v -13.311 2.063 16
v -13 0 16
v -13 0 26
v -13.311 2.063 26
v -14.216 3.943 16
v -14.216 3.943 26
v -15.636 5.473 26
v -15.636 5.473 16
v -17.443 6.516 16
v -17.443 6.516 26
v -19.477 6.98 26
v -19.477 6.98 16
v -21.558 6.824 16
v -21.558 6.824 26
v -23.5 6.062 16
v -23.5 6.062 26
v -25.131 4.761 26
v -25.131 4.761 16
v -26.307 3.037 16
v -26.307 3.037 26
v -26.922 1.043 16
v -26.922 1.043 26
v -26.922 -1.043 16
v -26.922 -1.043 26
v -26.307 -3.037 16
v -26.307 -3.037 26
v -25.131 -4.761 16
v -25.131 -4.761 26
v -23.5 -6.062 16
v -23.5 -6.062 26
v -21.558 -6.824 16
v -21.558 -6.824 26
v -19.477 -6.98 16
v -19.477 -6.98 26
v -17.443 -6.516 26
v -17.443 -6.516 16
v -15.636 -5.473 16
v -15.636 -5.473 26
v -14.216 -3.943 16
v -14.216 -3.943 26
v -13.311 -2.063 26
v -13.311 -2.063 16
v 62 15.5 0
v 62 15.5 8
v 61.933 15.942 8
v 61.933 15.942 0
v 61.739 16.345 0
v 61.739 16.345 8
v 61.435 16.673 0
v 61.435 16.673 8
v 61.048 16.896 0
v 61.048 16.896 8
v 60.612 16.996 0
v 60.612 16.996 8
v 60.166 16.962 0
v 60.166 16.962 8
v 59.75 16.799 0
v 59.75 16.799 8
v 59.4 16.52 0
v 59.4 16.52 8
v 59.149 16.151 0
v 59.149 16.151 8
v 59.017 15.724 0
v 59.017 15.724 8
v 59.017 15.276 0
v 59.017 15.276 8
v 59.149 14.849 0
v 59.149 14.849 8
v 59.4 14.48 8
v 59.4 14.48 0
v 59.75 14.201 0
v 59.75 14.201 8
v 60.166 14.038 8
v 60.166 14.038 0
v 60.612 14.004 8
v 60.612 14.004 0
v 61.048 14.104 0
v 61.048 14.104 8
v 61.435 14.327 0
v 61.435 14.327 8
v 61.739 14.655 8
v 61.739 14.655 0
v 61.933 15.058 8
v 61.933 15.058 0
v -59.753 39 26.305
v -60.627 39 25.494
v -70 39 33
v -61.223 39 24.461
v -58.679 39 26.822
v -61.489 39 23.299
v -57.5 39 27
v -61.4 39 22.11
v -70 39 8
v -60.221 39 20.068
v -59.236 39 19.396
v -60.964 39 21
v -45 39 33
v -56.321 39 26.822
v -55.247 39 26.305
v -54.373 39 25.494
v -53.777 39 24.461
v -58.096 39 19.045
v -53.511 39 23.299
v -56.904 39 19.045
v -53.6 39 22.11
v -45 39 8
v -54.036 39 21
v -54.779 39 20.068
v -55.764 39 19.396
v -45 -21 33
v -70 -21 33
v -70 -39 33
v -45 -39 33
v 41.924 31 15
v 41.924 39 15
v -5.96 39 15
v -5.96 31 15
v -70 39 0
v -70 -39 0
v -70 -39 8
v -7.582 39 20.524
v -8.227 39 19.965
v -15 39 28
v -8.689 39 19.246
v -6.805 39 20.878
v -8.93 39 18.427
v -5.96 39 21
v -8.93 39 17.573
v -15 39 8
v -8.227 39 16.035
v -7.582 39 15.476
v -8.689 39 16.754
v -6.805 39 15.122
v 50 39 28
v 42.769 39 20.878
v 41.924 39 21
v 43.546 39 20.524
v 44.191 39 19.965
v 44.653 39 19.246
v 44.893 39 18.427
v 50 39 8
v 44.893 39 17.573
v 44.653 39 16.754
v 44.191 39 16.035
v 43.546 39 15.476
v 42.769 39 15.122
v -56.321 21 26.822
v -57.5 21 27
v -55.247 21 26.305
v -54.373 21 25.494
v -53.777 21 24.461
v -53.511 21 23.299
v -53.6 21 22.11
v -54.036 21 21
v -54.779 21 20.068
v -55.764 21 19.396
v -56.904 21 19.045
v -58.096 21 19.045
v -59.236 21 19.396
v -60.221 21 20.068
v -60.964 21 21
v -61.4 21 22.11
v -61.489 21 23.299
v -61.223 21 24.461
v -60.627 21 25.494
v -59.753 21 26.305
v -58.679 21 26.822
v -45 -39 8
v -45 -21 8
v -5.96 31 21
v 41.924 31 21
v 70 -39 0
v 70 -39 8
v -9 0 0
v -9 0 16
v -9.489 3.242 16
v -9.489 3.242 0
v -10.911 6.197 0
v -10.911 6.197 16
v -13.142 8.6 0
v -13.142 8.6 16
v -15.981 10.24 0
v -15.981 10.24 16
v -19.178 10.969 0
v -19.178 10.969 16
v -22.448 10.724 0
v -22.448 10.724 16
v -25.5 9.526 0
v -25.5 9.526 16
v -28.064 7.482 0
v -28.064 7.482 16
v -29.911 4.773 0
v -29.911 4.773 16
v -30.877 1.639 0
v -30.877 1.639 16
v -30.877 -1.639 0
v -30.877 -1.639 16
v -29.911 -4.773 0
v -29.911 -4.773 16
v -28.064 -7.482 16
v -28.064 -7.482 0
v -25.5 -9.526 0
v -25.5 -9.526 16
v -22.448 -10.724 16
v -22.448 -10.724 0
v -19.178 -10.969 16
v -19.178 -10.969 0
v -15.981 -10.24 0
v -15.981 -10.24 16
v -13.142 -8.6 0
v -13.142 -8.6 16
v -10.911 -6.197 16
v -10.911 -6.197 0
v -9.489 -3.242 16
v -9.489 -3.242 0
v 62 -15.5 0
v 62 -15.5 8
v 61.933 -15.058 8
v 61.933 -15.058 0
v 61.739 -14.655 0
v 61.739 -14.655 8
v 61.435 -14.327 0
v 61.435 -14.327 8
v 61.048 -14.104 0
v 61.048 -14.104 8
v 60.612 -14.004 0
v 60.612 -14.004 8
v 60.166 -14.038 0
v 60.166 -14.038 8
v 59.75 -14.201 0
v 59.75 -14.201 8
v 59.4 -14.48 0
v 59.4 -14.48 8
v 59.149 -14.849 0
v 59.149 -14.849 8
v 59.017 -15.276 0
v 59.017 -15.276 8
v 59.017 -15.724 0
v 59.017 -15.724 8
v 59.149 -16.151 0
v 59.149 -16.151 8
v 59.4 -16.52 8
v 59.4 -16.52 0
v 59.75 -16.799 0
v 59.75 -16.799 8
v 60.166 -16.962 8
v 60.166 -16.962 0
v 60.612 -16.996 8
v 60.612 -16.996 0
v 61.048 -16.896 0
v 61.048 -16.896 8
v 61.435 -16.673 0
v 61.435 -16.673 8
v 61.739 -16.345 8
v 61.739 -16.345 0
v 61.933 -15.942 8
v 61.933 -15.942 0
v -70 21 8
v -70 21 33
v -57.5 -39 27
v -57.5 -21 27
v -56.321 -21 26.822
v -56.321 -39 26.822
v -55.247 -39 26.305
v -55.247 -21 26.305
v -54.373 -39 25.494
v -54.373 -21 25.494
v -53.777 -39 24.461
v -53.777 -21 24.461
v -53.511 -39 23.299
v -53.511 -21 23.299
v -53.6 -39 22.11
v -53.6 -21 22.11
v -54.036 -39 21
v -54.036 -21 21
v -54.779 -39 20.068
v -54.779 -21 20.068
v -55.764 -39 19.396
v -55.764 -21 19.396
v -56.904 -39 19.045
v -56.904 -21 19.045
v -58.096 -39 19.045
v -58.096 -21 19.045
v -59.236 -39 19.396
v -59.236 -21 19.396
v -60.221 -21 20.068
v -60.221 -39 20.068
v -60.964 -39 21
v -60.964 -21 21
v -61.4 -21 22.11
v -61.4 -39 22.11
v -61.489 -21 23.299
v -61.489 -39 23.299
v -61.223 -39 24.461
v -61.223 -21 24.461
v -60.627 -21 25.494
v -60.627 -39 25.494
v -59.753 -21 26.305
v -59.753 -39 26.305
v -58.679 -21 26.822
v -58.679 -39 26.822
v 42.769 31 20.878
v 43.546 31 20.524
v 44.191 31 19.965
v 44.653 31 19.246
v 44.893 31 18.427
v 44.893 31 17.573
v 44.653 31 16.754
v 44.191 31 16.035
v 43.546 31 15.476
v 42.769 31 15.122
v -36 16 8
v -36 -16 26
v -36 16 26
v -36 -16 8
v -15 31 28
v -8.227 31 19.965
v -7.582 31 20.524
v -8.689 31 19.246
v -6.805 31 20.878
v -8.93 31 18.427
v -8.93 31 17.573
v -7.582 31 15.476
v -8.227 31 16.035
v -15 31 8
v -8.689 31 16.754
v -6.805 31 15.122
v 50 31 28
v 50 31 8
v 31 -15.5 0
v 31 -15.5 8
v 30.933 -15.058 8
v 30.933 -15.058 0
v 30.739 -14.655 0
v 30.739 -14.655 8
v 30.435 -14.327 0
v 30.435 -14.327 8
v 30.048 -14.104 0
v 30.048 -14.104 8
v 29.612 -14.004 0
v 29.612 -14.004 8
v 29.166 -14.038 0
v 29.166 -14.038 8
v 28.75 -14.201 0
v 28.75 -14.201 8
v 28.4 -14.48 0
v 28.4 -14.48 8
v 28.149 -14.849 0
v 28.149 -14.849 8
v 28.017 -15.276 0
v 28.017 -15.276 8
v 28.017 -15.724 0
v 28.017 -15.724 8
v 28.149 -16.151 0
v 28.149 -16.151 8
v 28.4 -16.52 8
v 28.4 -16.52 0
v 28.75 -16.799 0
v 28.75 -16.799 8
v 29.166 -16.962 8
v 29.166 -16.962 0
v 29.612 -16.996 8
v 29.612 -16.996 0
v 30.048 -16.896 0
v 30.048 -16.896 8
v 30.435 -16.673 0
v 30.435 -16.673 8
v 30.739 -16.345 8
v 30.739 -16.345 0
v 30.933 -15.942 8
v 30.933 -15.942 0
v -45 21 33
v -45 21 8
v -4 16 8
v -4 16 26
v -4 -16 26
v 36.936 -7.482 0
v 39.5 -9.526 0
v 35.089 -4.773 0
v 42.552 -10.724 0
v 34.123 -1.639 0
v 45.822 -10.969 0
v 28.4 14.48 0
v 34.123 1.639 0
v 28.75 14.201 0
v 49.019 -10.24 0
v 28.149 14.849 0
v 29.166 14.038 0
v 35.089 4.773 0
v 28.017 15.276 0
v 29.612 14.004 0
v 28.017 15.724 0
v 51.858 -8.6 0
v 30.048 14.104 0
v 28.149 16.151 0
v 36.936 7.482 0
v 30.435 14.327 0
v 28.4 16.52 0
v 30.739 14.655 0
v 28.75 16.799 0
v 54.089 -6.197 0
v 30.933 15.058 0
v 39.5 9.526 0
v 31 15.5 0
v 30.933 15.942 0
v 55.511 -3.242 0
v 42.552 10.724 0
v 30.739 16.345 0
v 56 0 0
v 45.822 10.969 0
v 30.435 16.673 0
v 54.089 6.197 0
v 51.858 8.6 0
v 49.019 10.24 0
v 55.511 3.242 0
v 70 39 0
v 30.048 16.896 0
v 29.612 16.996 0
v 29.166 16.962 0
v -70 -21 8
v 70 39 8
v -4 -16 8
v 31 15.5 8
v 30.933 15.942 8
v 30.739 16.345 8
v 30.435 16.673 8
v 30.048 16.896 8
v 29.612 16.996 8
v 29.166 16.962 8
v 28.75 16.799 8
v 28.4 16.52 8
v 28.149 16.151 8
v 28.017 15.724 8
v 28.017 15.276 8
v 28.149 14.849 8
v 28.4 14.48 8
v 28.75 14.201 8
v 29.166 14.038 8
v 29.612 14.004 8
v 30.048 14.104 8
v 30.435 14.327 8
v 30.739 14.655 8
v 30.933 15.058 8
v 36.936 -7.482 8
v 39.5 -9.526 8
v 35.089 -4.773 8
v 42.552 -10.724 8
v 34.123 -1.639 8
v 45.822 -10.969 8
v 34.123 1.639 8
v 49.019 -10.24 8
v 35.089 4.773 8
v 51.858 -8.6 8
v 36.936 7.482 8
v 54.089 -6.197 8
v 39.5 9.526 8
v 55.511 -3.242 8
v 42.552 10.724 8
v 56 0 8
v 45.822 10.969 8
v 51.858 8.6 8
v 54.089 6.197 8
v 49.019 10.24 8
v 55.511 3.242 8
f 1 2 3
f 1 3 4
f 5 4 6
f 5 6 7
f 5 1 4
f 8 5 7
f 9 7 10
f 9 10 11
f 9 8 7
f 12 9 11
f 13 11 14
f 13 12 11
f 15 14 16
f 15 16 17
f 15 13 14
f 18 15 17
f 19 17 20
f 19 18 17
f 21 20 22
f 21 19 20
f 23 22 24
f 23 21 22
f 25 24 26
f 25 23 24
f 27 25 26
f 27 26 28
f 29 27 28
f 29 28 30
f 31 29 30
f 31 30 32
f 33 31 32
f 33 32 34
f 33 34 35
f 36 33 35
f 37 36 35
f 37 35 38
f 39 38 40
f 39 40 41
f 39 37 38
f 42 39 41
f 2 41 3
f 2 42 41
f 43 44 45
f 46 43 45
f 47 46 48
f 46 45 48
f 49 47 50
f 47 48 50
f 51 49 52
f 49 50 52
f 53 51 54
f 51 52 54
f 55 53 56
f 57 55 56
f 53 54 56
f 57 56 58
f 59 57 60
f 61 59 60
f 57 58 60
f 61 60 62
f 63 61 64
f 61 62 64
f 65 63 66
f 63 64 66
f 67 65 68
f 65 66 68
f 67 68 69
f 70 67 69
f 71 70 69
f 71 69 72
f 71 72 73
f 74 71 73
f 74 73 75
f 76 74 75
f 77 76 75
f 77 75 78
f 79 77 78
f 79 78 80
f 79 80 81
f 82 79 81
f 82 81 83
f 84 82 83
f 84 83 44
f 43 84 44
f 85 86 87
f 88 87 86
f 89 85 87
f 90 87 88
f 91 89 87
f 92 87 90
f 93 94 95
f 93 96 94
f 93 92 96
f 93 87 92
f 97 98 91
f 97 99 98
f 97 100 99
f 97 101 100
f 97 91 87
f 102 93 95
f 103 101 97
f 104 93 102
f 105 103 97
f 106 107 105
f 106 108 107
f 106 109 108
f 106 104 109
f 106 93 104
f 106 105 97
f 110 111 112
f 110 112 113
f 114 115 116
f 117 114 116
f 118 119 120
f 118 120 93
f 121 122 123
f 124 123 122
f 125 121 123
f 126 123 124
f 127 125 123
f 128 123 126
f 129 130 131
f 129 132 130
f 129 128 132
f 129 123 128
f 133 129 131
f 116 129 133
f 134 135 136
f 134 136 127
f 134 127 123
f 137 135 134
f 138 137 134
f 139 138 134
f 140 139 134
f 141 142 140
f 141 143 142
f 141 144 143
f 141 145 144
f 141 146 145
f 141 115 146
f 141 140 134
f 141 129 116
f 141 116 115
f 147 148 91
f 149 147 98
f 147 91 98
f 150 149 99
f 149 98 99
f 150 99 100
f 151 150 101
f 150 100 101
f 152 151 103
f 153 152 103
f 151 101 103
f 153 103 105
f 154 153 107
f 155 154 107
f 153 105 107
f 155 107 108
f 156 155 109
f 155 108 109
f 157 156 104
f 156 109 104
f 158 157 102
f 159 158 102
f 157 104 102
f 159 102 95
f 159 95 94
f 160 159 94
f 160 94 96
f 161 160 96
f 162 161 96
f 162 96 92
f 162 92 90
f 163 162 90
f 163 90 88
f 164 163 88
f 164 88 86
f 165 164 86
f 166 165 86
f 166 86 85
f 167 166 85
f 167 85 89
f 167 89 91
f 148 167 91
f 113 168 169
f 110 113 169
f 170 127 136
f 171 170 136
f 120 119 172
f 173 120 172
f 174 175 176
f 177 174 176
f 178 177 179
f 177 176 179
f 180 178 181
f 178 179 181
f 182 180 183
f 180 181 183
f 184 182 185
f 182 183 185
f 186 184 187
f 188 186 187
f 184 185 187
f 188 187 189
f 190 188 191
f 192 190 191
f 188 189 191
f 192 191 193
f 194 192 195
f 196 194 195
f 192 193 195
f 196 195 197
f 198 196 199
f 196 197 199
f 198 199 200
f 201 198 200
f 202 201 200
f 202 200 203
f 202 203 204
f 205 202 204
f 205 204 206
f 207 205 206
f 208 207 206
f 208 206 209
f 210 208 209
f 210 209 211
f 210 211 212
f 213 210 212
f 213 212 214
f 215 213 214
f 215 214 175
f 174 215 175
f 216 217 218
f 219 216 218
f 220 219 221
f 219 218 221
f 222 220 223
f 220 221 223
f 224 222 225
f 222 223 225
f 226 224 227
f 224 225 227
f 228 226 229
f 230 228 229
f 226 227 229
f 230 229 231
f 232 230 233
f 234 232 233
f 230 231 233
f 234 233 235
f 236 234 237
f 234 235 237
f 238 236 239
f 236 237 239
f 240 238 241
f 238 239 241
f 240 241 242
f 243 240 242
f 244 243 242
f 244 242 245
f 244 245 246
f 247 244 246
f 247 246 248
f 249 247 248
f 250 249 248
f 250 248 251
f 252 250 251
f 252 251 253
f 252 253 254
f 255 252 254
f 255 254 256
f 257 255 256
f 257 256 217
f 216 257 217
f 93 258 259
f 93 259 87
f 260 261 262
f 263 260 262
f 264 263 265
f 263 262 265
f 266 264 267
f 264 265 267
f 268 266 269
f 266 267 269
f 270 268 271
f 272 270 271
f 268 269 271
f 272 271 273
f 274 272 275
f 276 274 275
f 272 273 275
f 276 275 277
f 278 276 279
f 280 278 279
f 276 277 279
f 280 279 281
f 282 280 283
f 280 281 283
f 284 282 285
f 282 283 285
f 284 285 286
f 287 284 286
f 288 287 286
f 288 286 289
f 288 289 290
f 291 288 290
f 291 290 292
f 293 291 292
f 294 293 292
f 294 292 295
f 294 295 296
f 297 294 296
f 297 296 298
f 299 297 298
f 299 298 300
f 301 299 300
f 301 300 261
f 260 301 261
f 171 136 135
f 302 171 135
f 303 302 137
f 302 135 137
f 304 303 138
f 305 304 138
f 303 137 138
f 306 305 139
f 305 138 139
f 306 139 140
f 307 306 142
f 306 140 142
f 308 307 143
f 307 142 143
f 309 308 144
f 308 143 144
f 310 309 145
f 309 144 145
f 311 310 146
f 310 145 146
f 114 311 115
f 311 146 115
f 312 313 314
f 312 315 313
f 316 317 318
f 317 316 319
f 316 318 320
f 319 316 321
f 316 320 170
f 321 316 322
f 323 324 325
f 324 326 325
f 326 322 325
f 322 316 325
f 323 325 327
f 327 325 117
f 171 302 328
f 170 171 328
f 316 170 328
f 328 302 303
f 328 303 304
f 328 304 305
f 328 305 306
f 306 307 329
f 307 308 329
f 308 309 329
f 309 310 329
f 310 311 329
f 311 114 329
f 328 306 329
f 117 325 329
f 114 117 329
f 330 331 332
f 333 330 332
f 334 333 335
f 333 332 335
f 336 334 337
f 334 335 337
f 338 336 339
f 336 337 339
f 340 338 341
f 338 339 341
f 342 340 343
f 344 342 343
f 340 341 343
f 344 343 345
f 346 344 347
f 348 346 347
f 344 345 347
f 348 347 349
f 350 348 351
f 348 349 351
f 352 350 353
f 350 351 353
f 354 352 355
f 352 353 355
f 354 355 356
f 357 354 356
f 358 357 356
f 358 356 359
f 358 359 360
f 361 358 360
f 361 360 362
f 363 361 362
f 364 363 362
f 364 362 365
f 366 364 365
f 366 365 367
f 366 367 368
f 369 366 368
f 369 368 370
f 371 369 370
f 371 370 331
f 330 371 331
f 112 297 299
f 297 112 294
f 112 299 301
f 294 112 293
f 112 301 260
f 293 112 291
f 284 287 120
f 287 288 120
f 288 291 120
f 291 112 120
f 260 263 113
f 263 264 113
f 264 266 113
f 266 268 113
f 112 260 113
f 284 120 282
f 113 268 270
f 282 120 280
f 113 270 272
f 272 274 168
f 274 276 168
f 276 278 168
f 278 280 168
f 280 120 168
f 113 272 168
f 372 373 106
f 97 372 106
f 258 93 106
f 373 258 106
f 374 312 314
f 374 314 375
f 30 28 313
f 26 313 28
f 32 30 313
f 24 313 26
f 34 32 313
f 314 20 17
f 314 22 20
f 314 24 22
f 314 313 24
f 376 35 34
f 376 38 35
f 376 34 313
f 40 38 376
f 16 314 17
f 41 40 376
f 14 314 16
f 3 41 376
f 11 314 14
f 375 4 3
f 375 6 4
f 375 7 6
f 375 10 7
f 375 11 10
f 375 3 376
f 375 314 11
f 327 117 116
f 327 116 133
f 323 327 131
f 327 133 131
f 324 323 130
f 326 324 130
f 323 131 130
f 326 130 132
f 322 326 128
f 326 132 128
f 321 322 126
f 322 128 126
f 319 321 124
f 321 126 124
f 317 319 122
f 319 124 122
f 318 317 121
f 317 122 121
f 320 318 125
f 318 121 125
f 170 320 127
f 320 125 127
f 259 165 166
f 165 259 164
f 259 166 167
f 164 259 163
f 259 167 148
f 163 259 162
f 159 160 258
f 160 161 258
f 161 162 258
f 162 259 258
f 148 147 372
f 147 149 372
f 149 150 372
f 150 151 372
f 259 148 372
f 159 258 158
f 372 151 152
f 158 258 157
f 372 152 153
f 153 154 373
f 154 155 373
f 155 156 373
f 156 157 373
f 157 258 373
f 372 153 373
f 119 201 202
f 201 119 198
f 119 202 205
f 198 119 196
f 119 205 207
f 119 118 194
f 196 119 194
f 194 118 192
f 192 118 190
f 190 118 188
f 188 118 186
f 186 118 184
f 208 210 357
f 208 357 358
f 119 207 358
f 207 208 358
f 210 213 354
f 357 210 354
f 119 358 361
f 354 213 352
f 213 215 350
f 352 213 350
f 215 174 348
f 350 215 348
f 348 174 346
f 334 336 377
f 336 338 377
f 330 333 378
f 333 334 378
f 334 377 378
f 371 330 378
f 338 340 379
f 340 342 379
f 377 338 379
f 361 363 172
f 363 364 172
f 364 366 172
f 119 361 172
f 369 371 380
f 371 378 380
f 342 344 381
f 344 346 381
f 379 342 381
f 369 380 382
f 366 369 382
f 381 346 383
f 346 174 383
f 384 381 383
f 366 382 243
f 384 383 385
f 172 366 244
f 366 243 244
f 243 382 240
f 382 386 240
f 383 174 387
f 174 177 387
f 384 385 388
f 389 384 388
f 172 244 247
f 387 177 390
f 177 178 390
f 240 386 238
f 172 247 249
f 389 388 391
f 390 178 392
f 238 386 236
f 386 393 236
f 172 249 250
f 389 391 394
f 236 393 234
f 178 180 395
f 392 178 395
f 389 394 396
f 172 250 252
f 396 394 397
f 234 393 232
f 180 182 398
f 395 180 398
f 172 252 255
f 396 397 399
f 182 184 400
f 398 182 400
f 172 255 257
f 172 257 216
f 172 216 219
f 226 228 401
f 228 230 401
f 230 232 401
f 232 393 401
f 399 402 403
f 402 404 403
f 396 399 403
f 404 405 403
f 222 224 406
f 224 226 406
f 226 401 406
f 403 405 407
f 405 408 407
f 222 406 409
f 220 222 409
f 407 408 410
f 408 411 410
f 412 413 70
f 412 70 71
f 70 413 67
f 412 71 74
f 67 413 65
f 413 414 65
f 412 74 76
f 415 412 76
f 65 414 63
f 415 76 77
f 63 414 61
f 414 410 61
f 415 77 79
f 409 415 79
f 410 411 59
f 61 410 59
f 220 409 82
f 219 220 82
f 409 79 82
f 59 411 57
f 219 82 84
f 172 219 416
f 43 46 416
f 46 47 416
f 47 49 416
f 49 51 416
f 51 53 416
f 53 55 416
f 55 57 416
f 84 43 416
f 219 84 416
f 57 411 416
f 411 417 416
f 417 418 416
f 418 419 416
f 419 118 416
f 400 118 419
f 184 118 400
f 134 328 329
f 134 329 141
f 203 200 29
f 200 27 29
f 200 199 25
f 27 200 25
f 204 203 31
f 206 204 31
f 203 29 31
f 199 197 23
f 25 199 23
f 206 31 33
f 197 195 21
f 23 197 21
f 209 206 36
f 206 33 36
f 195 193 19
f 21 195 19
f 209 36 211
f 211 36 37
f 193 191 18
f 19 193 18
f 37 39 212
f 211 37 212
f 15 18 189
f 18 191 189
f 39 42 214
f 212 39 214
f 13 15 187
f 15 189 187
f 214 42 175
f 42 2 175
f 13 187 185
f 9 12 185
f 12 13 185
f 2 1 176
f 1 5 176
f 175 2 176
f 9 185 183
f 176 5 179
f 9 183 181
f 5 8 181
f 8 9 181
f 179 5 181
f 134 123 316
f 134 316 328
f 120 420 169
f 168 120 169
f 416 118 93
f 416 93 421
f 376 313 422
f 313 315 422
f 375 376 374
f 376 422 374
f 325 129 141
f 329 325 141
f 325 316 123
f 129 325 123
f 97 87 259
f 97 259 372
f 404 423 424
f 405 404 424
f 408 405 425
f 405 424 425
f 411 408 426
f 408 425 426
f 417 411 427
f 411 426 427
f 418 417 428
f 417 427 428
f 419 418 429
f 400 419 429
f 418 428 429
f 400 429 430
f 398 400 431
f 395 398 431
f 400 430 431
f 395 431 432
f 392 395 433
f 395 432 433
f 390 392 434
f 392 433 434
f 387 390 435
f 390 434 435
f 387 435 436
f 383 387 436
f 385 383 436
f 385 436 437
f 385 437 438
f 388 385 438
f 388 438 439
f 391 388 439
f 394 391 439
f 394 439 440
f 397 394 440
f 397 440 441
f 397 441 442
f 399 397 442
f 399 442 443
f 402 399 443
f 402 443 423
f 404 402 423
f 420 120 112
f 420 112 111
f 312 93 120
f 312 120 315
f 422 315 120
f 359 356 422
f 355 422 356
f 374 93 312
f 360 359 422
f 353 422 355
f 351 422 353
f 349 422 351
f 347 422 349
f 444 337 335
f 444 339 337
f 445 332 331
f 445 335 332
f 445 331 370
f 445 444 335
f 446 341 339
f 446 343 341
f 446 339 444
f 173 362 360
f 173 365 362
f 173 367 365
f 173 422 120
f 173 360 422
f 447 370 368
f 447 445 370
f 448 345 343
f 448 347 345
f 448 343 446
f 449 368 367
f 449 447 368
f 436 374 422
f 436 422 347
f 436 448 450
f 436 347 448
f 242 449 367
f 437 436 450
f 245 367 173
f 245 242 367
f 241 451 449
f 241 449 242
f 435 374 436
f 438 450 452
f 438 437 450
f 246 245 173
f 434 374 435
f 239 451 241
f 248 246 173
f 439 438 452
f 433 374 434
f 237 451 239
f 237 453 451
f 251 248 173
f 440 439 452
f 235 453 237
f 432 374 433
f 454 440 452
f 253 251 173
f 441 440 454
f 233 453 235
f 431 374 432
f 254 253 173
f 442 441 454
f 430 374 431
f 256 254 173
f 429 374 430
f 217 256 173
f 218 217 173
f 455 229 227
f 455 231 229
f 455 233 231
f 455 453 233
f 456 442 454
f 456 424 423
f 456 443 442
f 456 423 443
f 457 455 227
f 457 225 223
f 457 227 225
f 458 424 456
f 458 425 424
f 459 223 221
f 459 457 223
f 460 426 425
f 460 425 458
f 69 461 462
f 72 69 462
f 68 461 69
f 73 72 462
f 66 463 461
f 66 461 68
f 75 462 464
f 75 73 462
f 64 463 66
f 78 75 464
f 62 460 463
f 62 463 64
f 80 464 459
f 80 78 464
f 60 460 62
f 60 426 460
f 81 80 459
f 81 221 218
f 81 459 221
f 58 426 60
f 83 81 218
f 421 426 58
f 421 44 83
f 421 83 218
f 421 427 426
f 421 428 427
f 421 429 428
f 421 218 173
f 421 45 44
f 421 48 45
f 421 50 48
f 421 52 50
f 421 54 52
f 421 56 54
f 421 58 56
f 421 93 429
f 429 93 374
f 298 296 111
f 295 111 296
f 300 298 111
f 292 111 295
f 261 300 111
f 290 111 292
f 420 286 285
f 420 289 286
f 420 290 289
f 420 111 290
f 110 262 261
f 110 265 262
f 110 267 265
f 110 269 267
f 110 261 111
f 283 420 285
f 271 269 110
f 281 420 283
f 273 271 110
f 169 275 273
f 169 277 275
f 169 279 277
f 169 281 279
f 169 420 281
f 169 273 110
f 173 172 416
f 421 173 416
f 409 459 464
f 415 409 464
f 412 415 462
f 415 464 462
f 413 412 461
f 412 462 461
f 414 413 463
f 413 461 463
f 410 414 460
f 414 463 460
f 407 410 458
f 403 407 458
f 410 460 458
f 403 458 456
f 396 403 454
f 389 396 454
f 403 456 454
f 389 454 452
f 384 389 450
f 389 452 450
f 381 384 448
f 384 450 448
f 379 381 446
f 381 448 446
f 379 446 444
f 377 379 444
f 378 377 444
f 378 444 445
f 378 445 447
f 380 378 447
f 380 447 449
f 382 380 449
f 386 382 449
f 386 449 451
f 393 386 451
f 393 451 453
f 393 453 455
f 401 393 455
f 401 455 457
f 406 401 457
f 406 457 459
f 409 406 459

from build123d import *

# Parameters (mm, degrees)
SKETCH1_W             = 140
SKETCH1_H             = 78
BOSS_EXTRUDE1_DEPTH   = 8
CUT_EXTRUDE1_REACH    = 82.529
SKETCH2_R             = 1.5
SKETCH2_R_2           = 11
SKETCH3_W             = 25
SKETCH3_H             = 18
BOSS_EXTRUDE2_DEPTH   = 25
BOSS_EXTRUDE2_2_DEPTH = 25
SKETCH4_R             = 4
CUT_EXTRUDE2_DEPTH    = 110.877204187
BOSS_EXTRUDE4_START   = 8
SKETCH7_W             = 32
SKETCH7_H             = 32
SKETCH7_R             = 11
BOSS_EXTRUDE4_DEPTH   = 8
SKETCH8_W             = 32
SKETCH8_H             = 32
SKETCH8_R             = 7
BOSS_EXTRUDE5_DEPTH   = 10
SKETCH9_W             = 65
SKETCH9_H             = 8
BOSS_EXTRUDE6_DEPTH   = 20
SKETCH11_R            = 3
CUT_EXTRUDE3_DEPTH    = 8


with BuildPart() as part:
    # Sketch1 → Boss-Extrude1 (new body)
    with BuildSketch(Plane.XY):
        Rectangle(SKETCH1_W, SKETCH1_H)
    extrude(amount=BOSS_EXTRUDE1_DEPTH)

    # Sketch2 → Cut-Extrude1 (cut, up to next)
    with BuildSketch(Plane.XY.offset(8), mode=Mode.PRIVATE) as cut_extrude1_sk1:
        with Locations((29.5, 15.5)):
            Circle(SKETCH2_R)
    cut_extrude1_tool1 = extrude(cut_extrude1_sk1.sketch, amount=-CUT_EXTRUDE1_REACH, mode=Mode.PRIVATE) & part.part
    # Sketch2 → Cut-Extrude1 (cut, up to next)
    with BuildSketch(Plane.XY.offset(8), mode=Mode.PRIVATE) as cut_extrude1_sk2:
        with Locations((60.5, 15.5)):
            Circle(SKETCH2_R)
    cut_extrude1_tool2 = extrude(cut_extrude1_sk2.sketch, amount=-CUT_EXTRUDE1_REACH, mode=Mode.PRIVATE) & part.part
    # Sketch2 → Cut-Extrude1 (cut, up to next)
    with BuildSketch(Plane.XY.offset(8), mode=Mode.PRIVATE) as cut_extrude1_sk3:
        with Locations((60.5, -15.5)):
            Circle(SKETCH2_R)
    cut_extrude1_tool3 = extrude(cut_extrude1_sk3.sketch, amount=-CUT_EXTRUDE1_REACH, mode=Mode.PRIVATE) & part.part
    # Sketch2 → Cut-Extrude1 (cut, up to next)
    with BuildSketch(Plane.XY.offset(8), mode=Mode.PRIVATE) as cut_extrude1_sk4:
        with Locations((29.5, -15.5)):
            Circle(SKETCH2_R)
    cut_extrude1_tool4 = extrude(cut_extrude1_sk4.sketch, amount=-CUT_EXTRUDE1_REACH, mode=Mode.PRIVATE) & part.part
    # Sketch2 → Cut-Extrude1 (cut, up to next)
    with BuildSketch(Plane.XY.offset(8), mode=Mode.PRIVATE) as cut_extrude1_sk5:
        with Locations((-20, 0)):
            Circle(SKETCH2_R_2)
    cut_extrude1_tool5 = extrude(cut_extrude1_sk5.sketch, amount=-CUT_EXTRUDE1_REACH, mode=Mode.PRIVATE) & part.part
    # Sketch2 → Cut-Extrude1 (cut, up to next)
    with BuildSketch(Plane.XY.offset(8), mode=Mode.PRIVATE) as cut_extrude1_sk6:
        with Locations((45, 0)):
            Circle(SKETCH2_R_2)
    cut_extrude1_tool6 = extrude(cut_extrude1_sk6.sketch, amount=-CUT_EXTRUDE1_REACH, mode=Mode.PRIVATE) & part.part
    add(cut_extrude1_tool1.solids().sort_by_distance((29.5, 15.5, 8))[0], mode=Mode.SUBTRACT)
    add(cut_extrude1_tool2.solids().sort_by_distance((60.5, 15.5, 8))[0], mode=Mode.SUBTRACT)
    add(cut_extrude1_tool3.solids().sort_by_distance((60.5, -15.5, 8))[0], mode=Mode.SUBTRACT)
    add(cut_extrude1_tool4.solids().sort_by_distance((29.5, -15.5, 8))[0], mode=Mode.SUBTRACT)
    add(cut_extrude1_tool5.solids().sort_by_distance((-20, 0, 8))[0], mode=Mode.SUBTRACT)
    add(cut_extrude1_tool6.solids().sort_by_distance((45, 0, 8))[0], mode=Mode.SUBTRACT)

    # Sketch7 → Boss-Extrude4 (add)
    with BuildSketch(Plane.XY.offset(8).offset(BOSS_EXTRUDE4_START)):
        with Locations((-20, 0)):
            Rectangle(SKETCH7_W, SKETCH7_H)
        with Locations((-20, 0)):
            Circle(SKETCH7_R, mode=Mode.SUBTRACT)
    extrude(amount=-BOSS_EXTRUDE4_DEPTH)

    # Sketch8 → Boss-Extrude5 (add)
    with BuildSketch(Plane.XY.offset(16)):
        with Locations((-20, 0)):
            Rectangle(SKETCH8_W, SKETCH8_H)
        with Locations((-20, 0)):
            Circle(SKETCH8_R, mode=Mode.SUBTRACT)
    extrude(amount=BOSS_EXTRUDE5_DEPTH)


with BuildPart() as body_2:
    # Sketch3 → Boss-Extrude2 (new body)
    with BuildSketch(Plane.XY.offset(8)):
        with Locations((-57.5, 30)):
            Rectangle(SKETCH3_W, SKETCH3_H)
    extrude(amount=BOSS_EXTRUDE2_DEPTH)


with BuildPart() as body_3:
    # Sketch3 → Boss-Extrude2 2 (new body)
    with BuildSketch(Plane.XY.offset(8)):
        with Locations((-57.5, -30)):
            Rectangle(SKETCH3_W, SKETCH3_H)
    extrude(amount=BOSS_EXTRUDE2_2_DEPTH)


with BuildPart() as cut_extrude2_tool:
    # Sketch4 → Cut-Extrude2 (new, through all)
    with BuildSketch(Plane(origin=(0, 39, 0), x_dir=(1, 0, 0), z_dir=(0, 1, 0))):
        with Locations(Location((-57.5, -23, 0), (0, 0, 270))):
            Circle(SKETCH4_R)
    extrude(amount=-CUT_EXTRUDE2_DEPTH)


with BuildPart() as body_2_1:
    add(body_2.part)

    # Cut-Extrude2: cut by cut_extrude2_tool
    add(cut_extrude2_tool.part, mode=Mode.SUBTRACT)


with BuildPart() as body_3_1:
    add(body_3.part)

    # Cut-Extrude2: cut by cut_extrude2_tool
    add(cut_extrude2_tool.part, mode=Mode.SUBTRACT)


with BuildPart() as body_4:
    # Sketch9 → Boss-Extrude6 (new body)
    with BuildSketch(Plane.XY.offset(8)):
        with Locations((17.5, 35)):
            Rectangle(SKETCH9_W, SKETCH9_H)
    extrude(amount=BOSS_EXTRUDE6_DEPTH)

    # Sketch11 → Cut-Extrude3 (cut)
    with BuildSketch(Plane(origin=(0, 39, 0), x_dir=(1, 0, 0), z_dir=(0, 1, 0))):
        with Locations((-5.960232812, -18)):
            Circle(SKETCH11_R)
        with BuildLine():
            Line((41.923671474, -15), (-5.960232812, -15))
            ThreePointArc((-5.960232812, -15), (-3.838912468, -15.878679656), (-2.960232812, -18))
            ThreePointArc((-2.960232812, -18), (-3.838912468, -20.121320344), (-5.960232812, -21))
            Line((-5.960232812, -21), (41.923671474, -21))
            ThreePointArc((41.923671474, -21), (38.923671474, -18), (41.923671474, -15))
        make_face()
        with Locations((41.923671474, -18)):
            Circle(SKETCH11_R)
    extrude(amount=-CUT_EXTRUDE3_DEPTH, mode=Mode.SUBTRACT)


solid = Compound([part.part, body_2_1.part, body_3_1.part, body_4.part])
